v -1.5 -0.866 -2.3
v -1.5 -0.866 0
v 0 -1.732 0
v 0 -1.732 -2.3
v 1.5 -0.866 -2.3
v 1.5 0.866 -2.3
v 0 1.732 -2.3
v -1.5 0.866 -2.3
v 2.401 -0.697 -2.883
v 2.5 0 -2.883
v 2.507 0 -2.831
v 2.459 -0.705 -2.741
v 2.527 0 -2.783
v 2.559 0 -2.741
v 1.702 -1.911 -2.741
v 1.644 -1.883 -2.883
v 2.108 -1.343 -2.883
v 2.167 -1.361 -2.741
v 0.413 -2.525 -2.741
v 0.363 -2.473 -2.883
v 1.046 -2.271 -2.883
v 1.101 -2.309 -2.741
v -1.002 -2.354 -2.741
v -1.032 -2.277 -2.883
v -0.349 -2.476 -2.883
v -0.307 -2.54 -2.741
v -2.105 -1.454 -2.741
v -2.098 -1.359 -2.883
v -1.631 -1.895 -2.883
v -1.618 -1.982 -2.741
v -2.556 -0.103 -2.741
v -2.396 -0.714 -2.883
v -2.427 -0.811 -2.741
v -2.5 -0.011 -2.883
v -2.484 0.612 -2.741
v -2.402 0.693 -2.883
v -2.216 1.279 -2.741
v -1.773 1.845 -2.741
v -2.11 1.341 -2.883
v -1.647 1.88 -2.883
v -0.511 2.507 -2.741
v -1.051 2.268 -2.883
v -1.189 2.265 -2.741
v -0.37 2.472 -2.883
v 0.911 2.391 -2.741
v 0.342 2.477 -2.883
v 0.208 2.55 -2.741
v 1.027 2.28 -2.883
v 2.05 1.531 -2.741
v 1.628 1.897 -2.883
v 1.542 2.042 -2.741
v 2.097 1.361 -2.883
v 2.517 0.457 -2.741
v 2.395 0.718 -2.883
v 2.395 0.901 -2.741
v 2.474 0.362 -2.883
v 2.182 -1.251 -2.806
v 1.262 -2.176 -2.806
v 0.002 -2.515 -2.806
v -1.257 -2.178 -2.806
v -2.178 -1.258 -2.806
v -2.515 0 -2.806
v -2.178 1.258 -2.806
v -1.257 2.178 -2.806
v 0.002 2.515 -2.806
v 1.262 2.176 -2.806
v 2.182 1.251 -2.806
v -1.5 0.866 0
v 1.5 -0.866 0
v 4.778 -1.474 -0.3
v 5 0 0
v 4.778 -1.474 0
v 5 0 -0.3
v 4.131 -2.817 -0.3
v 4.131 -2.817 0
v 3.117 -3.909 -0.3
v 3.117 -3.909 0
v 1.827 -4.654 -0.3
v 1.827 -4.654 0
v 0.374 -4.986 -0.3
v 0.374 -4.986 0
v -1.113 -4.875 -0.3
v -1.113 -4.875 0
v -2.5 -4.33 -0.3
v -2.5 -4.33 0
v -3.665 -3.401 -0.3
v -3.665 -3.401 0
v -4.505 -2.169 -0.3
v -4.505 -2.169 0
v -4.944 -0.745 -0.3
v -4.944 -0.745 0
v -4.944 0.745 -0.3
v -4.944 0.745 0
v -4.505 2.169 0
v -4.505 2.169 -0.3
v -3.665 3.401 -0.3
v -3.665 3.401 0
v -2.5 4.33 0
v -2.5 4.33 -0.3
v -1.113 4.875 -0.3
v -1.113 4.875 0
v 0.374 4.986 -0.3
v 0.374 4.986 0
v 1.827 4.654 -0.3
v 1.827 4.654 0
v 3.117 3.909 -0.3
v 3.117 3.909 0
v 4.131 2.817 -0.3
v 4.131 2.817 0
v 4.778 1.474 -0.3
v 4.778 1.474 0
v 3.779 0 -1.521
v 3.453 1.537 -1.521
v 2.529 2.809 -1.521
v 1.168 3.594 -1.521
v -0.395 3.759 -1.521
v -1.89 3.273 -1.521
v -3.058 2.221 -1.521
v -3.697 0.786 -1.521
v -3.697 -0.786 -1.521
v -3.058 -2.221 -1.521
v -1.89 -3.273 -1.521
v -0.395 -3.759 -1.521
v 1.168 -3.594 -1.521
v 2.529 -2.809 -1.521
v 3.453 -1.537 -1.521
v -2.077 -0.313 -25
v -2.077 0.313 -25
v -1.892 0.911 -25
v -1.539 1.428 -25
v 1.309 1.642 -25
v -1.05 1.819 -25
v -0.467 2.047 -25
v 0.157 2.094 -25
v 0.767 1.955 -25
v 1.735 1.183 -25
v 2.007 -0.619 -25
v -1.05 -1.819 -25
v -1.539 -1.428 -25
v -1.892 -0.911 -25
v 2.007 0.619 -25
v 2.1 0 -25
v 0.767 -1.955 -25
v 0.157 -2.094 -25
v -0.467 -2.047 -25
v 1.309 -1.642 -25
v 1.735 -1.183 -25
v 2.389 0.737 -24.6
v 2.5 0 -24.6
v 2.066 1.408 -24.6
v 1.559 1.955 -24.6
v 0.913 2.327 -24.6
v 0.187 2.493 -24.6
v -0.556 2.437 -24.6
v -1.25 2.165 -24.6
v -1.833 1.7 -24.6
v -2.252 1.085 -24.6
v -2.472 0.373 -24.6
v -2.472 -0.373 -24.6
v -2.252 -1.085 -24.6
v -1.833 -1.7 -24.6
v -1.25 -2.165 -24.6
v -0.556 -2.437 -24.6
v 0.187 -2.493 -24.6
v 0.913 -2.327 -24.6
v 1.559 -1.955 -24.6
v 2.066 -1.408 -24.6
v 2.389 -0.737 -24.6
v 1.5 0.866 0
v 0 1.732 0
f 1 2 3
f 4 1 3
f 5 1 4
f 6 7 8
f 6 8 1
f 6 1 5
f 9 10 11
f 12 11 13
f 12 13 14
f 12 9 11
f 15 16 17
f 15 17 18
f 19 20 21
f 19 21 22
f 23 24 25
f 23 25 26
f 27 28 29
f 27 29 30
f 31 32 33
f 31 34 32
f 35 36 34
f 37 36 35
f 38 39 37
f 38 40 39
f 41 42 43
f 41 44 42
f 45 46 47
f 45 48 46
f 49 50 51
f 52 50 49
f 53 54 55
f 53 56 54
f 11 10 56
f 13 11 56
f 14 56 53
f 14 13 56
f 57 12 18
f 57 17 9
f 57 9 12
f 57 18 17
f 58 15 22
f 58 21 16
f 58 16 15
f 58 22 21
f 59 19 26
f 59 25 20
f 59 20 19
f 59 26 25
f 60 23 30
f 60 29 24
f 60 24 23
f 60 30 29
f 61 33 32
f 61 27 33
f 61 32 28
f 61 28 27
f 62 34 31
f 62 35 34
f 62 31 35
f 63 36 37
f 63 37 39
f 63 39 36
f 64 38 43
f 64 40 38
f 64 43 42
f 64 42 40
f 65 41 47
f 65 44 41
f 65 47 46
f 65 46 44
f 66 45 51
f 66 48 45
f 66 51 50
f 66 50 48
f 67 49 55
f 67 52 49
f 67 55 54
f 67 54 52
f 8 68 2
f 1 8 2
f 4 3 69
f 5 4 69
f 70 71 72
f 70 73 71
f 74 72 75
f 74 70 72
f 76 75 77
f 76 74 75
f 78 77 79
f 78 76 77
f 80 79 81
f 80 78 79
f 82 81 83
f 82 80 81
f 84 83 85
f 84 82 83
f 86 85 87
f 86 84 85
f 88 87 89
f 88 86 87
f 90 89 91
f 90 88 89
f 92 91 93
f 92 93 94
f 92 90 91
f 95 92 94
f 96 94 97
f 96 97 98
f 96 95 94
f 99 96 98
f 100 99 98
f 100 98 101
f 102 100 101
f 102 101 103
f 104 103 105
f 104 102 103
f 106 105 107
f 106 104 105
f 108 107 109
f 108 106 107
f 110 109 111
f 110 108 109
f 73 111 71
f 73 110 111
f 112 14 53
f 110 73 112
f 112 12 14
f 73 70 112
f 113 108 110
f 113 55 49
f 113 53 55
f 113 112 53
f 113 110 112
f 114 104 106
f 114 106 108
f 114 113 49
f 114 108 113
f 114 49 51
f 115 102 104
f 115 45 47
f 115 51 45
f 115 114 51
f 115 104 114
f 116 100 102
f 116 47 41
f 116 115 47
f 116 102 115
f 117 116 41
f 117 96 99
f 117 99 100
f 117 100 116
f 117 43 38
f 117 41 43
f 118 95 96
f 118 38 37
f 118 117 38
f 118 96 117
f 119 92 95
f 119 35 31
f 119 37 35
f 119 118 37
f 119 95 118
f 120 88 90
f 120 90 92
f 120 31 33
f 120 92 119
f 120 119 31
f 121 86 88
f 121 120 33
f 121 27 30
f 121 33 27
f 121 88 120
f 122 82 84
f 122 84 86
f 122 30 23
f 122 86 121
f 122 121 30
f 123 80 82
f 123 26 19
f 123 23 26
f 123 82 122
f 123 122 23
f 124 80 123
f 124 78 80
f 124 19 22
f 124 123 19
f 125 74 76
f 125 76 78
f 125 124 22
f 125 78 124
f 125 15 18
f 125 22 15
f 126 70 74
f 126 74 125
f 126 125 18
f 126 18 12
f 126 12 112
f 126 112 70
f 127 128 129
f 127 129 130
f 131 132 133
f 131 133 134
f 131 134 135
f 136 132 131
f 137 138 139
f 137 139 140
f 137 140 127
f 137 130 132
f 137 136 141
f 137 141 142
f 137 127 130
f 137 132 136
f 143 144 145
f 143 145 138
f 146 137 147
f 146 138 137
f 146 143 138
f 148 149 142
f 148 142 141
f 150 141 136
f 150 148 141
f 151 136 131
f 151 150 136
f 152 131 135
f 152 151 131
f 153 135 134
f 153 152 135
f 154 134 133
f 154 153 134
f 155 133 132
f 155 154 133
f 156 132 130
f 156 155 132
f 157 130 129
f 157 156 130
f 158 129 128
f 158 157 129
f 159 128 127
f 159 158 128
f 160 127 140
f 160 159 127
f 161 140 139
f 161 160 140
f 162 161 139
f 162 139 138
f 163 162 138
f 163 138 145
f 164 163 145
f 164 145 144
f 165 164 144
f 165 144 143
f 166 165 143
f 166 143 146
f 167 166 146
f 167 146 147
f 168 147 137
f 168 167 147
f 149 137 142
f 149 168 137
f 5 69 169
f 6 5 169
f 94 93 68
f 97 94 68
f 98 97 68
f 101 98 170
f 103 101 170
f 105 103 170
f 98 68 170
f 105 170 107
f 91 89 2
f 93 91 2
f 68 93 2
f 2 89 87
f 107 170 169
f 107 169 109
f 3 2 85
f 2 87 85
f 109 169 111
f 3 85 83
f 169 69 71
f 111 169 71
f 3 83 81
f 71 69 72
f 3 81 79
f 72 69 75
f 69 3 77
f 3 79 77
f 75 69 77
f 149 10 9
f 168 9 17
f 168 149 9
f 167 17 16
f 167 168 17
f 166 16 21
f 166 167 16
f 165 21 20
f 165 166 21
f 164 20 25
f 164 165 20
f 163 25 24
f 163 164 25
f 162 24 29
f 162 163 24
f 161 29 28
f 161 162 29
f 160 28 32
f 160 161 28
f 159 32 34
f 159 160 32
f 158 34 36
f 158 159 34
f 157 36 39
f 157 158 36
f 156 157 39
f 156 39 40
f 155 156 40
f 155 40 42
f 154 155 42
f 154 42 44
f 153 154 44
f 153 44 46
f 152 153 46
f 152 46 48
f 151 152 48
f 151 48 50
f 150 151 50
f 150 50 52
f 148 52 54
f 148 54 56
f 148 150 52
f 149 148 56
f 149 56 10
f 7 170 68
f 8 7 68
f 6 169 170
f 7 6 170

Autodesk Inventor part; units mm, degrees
ref_plane "YZ Plane" through (0, 0, 0) normal (1, 0, 0) x (0, 1, 0)
sketch "Szkic1" plane through (0, 0, 0) normal (0, 1, 0) x (-1, 0, 0)
  point P0 (0, 0)
sketch "Szkic2" plane through (0, 0, 0) normal (0, 1, 0) x (-1, 0, 0)
  line L0 (-2.5, -25) -> (0, -25)
  line L1 (-2.5, -2.8) -> (-2.5, -25)
  line L2 (-5, -0.3) -> (-2.5, -2.8)
  line L3 (-5, 0) -> (-5, -0.3)
  line L4 (0, 0) -> (-5, 0)
  line L5 (0, -25) -> (0, 0)
  line L6 (0, -25) -> (0, 0)
  line L7 (0, -30) -> (0, 5) projected
  line L8 (1, 0) -> (-6, 0) projected
  dimension "d3" = 5
  dimension "d5" = 2.5
  dimension "d7" = 25
  dimension "ParC" = 0.3
  dimension "d22" = 0
  dimension "d23" = 0
  dimension "d43" = 45
revolve "Obrót1" add sketch "Szkic2" angle 360 about axis through (0, 0, -25) along (0, 0, -1)
sketch "Szkic3" plane through (0, 0, 0) normal (0, 0, 1) x (1, 0, 0)
  line L0 (-1.5, 0.866) -> (-1.5, -0.866)
  line L1 (0, 1.7321) -> (-1.5, 0.866)
  line L2 (1.5, 0.866) -> (0, 1.7321)
  line L3 (1.5, -0.866) -> (1.5, 0.866)
  line L4 (0, -1.7321) -> (1.5, -0.866)
  line L5 (-1.5, -0.866) -> (0, -1.7321)
  circle A0 centre (0, 0) radius 1.5 construction
  circle A1 centre (0, 0) radius 2.5 construction
  dimension "d11" = 3
  dimension "d13" = 120
  dimension "d15" = 120
extrude "Wyciągnięcie proste1" cut sketch "Szkic3" against normal blind 2.3
fillet "Zaokrąglenie1" radius 0.2 1 edges at (-2.5, 0, -2.8)
chamfer "Faza1" distance 0.4 angle 45 1 edges at (-2.5, 0, -25) measured on face at (-0.599, -2.4272, -17.6276)
thread "Gwint1" size "M5x0.8" class "6g" standard "ISO Metric profile" length 16
ref_plane "MSC_PF1" through (0, 0, 0) normal (1, 0, 0) x (0, 1, 0)
ref_plane "MSC_PT1" through (0, 0, 0) normal (0, 0, -1) x (-1, 0, 0)
equation "\"d3\" = 0.5 * dk"
equation "\"d5\" = 0.5 * NND"
equation "\"d7\" = NLG"
equation "\"d43\" = 0.5 * ang"
equation "\"d11\" = ParS"
equation "\"d16\" = ParT"
equation "\"d18\" = r"
equation "\"d19\" = 0.5 * PTC"
equation "\"d39\" = 0.5 * PTC"
equation "\"NND\" = 5"
equation "\"PTC\" = 0.8"
equation "\"ParK\" = 2.8"
equation "\"ParS\" = 3"
equation "\"ParT\" = 2.3"
equation "\"r\" = 0.2"
equation "\"NLG\" = 25"
equation "\"ang\" = 90deg"
equation "\"THREADDIA\" = NND"
equation "\"dk\" = 10"
properties part number "DIN 7991 - M5x25" material "Stal, miękka"
